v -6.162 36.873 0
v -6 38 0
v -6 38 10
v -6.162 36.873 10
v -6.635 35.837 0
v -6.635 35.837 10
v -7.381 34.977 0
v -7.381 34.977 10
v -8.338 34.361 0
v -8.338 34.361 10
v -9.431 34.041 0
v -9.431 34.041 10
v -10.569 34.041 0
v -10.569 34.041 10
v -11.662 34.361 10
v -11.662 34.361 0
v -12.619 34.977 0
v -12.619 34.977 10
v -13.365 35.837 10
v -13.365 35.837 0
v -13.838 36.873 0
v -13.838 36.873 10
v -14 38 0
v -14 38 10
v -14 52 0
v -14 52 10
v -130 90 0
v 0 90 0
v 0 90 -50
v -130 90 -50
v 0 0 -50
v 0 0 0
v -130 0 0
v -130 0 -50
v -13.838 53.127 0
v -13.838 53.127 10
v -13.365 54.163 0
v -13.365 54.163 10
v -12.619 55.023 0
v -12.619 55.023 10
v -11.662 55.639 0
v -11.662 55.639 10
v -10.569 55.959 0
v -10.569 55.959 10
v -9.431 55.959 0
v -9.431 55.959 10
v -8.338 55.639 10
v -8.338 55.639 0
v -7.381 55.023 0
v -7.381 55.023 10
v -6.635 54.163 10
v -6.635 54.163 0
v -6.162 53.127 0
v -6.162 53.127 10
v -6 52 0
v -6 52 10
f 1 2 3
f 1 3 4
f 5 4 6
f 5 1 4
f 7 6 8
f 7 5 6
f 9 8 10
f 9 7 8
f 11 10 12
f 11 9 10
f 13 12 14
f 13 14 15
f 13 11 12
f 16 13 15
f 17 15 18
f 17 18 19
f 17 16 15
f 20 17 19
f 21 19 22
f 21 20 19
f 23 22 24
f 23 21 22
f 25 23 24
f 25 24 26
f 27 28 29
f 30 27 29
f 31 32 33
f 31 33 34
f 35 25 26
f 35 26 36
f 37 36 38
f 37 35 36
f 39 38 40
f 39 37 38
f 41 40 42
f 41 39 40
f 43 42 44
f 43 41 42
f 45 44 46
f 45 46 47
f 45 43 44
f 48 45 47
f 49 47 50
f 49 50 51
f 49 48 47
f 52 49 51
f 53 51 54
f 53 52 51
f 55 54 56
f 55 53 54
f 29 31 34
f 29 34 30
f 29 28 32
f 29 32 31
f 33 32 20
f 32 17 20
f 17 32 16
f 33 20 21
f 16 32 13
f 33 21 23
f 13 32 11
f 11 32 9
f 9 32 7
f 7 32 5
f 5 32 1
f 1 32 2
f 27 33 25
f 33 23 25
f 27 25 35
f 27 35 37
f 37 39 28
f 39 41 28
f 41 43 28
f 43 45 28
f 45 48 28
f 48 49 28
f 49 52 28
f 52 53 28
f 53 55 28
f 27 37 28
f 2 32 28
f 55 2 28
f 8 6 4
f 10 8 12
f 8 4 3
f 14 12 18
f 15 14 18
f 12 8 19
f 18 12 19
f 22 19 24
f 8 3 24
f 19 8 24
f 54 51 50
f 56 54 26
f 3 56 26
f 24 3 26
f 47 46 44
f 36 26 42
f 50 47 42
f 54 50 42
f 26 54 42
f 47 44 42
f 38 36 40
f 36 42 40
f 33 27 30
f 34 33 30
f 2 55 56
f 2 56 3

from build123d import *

# Parameters (mm, degrees)
SKETCH_1_W      = 50
SKETCH_1_H      = 90
EXTRUDE_1_DEPTH = 130
EXTRUDE_2_DEPTH = 10


with BuildPart() as part:
    # Эскиз1 → Бобышка-Вытянуть1 (new body)
    with BuildSketch(Plane(origin=(0, 0, 0), x_dir=(0, 0, -1), z_dir=(1, 0, 0))):
        with Locations((25, 45)):
            Rectangle(SKETCH_1_W, SKETCH_1_H)
    extrude(amount=-EXTRUDE_1_DEPTH)

    # Эскиз2 → Бобышка-Вытянуть2 (add)
    with BuildSketch(Plane.XY):
        with BuildLine():
            Line((-14, 38), (-14, 52))
            ThreePointArc((-14, 52), (-10, 56), (-6, 52))
            Line((-6, 52), (-6, 38))
            ThreePointArc((-6, 38), (-10, 34), (-14, 38))
        make_face()
    extrude(amount=EXTRUDE_2_DEPTH)


solid = part.part
